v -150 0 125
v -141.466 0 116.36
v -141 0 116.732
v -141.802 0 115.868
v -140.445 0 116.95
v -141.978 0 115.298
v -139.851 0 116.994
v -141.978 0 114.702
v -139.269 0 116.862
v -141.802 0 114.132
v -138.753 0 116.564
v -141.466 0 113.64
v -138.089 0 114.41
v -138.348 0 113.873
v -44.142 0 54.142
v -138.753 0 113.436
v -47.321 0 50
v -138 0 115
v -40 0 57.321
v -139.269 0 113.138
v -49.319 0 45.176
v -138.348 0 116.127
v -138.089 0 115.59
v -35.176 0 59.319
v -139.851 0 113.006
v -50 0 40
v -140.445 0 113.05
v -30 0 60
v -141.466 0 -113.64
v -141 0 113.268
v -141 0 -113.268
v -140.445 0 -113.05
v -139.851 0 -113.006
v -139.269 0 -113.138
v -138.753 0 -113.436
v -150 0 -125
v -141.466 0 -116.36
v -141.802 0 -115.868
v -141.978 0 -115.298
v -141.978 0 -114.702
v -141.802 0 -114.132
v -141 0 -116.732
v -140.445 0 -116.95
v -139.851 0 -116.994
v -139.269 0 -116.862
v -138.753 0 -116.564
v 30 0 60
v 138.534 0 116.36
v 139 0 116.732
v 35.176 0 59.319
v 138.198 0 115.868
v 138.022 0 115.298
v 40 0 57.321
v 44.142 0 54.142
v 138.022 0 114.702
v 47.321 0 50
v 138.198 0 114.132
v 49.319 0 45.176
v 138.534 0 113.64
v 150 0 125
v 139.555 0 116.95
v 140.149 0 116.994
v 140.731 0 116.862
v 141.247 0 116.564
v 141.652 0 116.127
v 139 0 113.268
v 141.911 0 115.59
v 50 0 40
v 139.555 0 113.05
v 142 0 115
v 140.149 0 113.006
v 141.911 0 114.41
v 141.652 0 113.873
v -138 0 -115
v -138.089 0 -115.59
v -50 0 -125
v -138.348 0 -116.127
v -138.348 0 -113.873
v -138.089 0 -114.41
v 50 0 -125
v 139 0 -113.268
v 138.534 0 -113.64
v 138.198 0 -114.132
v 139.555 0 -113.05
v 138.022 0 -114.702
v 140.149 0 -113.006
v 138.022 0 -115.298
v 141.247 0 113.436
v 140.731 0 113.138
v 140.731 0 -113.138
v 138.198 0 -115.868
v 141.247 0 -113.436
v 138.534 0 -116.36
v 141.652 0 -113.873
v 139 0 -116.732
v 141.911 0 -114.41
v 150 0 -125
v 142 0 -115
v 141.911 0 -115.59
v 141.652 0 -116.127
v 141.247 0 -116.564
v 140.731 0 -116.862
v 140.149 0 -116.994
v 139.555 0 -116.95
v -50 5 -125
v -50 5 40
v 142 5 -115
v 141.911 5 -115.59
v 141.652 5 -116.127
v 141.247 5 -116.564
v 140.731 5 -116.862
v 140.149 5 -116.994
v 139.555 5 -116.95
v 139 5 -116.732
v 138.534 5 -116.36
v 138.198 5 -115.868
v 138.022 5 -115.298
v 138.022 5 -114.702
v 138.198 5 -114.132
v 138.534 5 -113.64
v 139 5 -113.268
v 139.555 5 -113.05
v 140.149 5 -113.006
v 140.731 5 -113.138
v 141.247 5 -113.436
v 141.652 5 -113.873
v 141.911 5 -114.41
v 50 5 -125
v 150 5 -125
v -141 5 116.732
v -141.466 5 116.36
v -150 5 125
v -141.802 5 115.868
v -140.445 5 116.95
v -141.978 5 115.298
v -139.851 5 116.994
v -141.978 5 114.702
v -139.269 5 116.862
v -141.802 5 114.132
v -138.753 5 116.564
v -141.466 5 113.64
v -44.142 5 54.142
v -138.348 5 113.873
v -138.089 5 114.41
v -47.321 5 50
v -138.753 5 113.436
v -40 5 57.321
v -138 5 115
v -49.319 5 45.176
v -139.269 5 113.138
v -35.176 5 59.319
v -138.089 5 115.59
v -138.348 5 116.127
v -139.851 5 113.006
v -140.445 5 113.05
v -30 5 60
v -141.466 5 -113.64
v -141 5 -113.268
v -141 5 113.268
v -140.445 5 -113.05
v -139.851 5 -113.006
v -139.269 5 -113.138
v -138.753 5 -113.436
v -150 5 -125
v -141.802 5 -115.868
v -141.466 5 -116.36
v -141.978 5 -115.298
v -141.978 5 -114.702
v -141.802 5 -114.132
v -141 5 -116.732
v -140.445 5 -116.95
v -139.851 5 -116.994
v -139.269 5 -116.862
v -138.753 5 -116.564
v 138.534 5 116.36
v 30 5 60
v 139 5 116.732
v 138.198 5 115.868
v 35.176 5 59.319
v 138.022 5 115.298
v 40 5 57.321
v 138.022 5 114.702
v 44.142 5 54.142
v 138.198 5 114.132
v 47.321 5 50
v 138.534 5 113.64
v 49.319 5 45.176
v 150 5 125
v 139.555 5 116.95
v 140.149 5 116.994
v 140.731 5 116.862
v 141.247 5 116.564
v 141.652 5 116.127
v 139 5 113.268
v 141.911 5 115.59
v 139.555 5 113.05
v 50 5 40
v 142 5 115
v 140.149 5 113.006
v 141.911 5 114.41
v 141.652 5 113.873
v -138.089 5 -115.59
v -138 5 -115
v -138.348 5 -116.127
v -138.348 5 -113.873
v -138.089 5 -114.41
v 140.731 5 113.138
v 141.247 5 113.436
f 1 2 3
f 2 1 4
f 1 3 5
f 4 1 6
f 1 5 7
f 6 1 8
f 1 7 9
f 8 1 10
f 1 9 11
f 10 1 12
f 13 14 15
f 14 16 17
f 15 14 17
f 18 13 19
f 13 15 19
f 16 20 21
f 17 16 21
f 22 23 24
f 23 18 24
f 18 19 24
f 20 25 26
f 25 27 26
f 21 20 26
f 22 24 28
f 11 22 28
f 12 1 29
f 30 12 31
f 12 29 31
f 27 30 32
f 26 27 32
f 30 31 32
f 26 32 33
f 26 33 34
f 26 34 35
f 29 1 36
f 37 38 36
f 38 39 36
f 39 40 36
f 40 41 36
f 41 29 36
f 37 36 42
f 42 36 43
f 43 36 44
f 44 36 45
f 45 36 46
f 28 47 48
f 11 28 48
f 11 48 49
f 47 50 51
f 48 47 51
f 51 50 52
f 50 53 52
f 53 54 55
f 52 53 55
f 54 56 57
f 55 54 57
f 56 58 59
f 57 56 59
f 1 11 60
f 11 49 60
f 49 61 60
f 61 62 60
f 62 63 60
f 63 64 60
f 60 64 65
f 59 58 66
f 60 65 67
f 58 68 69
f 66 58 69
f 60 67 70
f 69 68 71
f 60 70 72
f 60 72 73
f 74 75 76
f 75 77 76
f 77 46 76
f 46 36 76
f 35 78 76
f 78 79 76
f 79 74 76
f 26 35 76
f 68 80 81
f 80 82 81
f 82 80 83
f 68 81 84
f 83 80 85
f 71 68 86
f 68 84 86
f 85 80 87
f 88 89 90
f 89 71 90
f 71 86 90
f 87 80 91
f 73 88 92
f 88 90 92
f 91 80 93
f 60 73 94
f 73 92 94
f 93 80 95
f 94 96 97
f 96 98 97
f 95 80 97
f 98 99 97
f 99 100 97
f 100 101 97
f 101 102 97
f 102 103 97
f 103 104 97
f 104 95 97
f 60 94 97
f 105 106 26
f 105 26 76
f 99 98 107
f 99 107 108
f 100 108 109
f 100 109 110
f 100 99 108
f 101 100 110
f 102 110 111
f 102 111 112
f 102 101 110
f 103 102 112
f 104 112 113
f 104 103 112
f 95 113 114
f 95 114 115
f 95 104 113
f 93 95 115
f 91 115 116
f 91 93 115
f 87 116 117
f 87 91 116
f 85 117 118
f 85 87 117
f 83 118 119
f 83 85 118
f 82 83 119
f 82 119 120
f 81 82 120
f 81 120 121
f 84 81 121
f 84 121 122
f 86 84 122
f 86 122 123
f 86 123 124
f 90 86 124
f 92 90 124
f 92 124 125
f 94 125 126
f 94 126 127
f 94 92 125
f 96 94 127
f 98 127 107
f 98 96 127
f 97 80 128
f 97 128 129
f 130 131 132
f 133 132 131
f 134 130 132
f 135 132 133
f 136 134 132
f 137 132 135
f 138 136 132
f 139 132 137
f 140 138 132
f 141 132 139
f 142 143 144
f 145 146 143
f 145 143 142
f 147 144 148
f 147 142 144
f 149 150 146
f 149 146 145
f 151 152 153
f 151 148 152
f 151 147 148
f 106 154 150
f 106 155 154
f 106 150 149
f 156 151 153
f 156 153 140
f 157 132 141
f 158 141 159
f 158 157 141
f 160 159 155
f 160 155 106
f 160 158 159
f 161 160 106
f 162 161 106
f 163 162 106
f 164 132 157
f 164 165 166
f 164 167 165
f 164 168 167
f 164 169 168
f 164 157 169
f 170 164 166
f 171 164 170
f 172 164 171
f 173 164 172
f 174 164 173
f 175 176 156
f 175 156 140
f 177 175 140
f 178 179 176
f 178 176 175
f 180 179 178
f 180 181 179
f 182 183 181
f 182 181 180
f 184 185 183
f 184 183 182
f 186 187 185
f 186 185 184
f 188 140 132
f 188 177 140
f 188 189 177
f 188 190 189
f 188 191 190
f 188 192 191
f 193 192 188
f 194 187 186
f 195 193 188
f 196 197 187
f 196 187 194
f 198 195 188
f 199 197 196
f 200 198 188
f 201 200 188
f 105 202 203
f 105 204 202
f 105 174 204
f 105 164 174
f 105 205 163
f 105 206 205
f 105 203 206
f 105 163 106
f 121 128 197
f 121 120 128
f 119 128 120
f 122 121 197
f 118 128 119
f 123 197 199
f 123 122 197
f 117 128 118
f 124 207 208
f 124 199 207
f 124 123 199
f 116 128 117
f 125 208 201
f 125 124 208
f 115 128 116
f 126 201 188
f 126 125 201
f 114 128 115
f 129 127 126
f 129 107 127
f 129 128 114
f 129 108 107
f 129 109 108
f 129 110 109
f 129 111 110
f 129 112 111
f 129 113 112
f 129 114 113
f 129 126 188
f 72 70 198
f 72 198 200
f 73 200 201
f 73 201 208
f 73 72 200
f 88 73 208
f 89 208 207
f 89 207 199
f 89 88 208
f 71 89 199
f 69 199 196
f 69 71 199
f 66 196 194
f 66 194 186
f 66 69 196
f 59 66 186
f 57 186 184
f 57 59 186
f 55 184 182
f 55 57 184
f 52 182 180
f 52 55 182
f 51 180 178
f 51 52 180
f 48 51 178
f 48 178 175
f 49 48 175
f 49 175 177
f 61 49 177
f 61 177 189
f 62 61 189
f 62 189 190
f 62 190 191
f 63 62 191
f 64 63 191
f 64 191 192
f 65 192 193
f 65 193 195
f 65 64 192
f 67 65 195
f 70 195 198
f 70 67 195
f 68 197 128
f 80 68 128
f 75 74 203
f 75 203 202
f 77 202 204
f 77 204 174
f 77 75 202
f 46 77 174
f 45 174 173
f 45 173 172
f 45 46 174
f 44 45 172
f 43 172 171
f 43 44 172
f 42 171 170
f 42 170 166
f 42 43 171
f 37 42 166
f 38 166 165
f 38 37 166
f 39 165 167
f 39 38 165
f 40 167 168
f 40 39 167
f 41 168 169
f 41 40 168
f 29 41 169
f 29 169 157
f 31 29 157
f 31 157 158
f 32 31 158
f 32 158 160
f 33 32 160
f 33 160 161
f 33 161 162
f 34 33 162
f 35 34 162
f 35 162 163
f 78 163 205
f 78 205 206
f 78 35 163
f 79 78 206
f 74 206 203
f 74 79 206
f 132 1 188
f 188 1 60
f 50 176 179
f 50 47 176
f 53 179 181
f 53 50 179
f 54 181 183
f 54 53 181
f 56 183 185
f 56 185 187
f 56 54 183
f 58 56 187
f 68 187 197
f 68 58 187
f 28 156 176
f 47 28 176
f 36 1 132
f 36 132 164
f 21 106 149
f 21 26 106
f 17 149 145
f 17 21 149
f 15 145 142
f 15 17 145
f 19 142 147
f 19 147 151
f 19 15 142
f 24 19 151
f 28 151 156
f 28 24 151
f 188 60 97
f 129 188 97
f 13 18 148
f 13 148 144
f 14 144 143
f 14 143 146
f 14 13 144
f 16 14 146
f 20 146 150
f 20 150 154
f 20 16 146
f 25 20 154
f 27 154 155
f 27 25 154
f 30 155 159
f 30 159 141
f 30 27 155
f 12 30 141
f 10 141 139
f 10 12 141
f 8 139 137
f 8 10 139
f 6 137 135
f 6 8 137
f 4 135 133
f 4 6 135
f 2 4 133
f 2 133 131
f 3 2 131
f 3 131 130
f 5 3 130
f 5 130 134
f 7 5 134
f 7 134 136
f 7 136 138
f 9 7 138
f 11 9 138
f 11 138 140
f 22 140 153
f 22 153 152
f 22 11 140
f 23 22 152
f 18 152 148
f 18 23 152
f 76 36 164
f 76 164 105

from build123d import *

# Parameters (mm, degrees)
SKETCH1_W           = 300
SKETCH1_H           = 250
SKETCH1_R           = 2
BOSS_EXTRUDE1_DEPTH = 5
SKETCH2_W           = 100
SKETCH2_H           = 185
CUT_EXTRUDE1_DEPTH  = 6
FILLET1_R           = 20


with BuildPart() as part:
    # Sketch1 → Boss-Extrude1 (new body)
    with BuildSketch(Plane(origin=(0, 0, 0), x_dir=(1, 0, 0), z_dir=(0, 1, 0))):
        Rectangle(SKETCH1_W, SKETCH1_H)
        with Locations((-140, -115)):
            Circle(SKETCH1_R, mode=Mode.SUBTRACT)
        with Locations((-140, 115)):
            Circle(SKETCH1_R, mode=Mode.SUBTRACT)
        with Locations((140, -115)):
            Circle(SKETCH1_R, mode=Mode.SUBTRACT)
        with Locations((140, 115)):
            Circle(SKETCH1_R, mode=Mode.SUBTRACT)
    extrude(amount=BOSS_EXTRUDE1_DEPTH)

    # Sketch2 → Cut-Extrude1 (cut, through all)
    with BuildSketch(Plane(origin=(0, 5, 0), x_dir=(1, 0, 0), z_dir=(0, 1, 0))):
        with Locations((0, 32.5)):
            Rectangle(SKETCH2_W, SKETCH2_H)
    extrude(amount=-CUT_EXTRUDE1_DEPTH, mode=Mode.SUBTRACT)

    # Fillet1
    fillet1_edges = [part.edges().sort_by_distance(p)[0] for p in [
        (-50, 2.5, 60),
        (50, 2.5, 60),
    ]]
    fillet(fillet1_edges, radius=FILLET1_R)


solid = part.part
